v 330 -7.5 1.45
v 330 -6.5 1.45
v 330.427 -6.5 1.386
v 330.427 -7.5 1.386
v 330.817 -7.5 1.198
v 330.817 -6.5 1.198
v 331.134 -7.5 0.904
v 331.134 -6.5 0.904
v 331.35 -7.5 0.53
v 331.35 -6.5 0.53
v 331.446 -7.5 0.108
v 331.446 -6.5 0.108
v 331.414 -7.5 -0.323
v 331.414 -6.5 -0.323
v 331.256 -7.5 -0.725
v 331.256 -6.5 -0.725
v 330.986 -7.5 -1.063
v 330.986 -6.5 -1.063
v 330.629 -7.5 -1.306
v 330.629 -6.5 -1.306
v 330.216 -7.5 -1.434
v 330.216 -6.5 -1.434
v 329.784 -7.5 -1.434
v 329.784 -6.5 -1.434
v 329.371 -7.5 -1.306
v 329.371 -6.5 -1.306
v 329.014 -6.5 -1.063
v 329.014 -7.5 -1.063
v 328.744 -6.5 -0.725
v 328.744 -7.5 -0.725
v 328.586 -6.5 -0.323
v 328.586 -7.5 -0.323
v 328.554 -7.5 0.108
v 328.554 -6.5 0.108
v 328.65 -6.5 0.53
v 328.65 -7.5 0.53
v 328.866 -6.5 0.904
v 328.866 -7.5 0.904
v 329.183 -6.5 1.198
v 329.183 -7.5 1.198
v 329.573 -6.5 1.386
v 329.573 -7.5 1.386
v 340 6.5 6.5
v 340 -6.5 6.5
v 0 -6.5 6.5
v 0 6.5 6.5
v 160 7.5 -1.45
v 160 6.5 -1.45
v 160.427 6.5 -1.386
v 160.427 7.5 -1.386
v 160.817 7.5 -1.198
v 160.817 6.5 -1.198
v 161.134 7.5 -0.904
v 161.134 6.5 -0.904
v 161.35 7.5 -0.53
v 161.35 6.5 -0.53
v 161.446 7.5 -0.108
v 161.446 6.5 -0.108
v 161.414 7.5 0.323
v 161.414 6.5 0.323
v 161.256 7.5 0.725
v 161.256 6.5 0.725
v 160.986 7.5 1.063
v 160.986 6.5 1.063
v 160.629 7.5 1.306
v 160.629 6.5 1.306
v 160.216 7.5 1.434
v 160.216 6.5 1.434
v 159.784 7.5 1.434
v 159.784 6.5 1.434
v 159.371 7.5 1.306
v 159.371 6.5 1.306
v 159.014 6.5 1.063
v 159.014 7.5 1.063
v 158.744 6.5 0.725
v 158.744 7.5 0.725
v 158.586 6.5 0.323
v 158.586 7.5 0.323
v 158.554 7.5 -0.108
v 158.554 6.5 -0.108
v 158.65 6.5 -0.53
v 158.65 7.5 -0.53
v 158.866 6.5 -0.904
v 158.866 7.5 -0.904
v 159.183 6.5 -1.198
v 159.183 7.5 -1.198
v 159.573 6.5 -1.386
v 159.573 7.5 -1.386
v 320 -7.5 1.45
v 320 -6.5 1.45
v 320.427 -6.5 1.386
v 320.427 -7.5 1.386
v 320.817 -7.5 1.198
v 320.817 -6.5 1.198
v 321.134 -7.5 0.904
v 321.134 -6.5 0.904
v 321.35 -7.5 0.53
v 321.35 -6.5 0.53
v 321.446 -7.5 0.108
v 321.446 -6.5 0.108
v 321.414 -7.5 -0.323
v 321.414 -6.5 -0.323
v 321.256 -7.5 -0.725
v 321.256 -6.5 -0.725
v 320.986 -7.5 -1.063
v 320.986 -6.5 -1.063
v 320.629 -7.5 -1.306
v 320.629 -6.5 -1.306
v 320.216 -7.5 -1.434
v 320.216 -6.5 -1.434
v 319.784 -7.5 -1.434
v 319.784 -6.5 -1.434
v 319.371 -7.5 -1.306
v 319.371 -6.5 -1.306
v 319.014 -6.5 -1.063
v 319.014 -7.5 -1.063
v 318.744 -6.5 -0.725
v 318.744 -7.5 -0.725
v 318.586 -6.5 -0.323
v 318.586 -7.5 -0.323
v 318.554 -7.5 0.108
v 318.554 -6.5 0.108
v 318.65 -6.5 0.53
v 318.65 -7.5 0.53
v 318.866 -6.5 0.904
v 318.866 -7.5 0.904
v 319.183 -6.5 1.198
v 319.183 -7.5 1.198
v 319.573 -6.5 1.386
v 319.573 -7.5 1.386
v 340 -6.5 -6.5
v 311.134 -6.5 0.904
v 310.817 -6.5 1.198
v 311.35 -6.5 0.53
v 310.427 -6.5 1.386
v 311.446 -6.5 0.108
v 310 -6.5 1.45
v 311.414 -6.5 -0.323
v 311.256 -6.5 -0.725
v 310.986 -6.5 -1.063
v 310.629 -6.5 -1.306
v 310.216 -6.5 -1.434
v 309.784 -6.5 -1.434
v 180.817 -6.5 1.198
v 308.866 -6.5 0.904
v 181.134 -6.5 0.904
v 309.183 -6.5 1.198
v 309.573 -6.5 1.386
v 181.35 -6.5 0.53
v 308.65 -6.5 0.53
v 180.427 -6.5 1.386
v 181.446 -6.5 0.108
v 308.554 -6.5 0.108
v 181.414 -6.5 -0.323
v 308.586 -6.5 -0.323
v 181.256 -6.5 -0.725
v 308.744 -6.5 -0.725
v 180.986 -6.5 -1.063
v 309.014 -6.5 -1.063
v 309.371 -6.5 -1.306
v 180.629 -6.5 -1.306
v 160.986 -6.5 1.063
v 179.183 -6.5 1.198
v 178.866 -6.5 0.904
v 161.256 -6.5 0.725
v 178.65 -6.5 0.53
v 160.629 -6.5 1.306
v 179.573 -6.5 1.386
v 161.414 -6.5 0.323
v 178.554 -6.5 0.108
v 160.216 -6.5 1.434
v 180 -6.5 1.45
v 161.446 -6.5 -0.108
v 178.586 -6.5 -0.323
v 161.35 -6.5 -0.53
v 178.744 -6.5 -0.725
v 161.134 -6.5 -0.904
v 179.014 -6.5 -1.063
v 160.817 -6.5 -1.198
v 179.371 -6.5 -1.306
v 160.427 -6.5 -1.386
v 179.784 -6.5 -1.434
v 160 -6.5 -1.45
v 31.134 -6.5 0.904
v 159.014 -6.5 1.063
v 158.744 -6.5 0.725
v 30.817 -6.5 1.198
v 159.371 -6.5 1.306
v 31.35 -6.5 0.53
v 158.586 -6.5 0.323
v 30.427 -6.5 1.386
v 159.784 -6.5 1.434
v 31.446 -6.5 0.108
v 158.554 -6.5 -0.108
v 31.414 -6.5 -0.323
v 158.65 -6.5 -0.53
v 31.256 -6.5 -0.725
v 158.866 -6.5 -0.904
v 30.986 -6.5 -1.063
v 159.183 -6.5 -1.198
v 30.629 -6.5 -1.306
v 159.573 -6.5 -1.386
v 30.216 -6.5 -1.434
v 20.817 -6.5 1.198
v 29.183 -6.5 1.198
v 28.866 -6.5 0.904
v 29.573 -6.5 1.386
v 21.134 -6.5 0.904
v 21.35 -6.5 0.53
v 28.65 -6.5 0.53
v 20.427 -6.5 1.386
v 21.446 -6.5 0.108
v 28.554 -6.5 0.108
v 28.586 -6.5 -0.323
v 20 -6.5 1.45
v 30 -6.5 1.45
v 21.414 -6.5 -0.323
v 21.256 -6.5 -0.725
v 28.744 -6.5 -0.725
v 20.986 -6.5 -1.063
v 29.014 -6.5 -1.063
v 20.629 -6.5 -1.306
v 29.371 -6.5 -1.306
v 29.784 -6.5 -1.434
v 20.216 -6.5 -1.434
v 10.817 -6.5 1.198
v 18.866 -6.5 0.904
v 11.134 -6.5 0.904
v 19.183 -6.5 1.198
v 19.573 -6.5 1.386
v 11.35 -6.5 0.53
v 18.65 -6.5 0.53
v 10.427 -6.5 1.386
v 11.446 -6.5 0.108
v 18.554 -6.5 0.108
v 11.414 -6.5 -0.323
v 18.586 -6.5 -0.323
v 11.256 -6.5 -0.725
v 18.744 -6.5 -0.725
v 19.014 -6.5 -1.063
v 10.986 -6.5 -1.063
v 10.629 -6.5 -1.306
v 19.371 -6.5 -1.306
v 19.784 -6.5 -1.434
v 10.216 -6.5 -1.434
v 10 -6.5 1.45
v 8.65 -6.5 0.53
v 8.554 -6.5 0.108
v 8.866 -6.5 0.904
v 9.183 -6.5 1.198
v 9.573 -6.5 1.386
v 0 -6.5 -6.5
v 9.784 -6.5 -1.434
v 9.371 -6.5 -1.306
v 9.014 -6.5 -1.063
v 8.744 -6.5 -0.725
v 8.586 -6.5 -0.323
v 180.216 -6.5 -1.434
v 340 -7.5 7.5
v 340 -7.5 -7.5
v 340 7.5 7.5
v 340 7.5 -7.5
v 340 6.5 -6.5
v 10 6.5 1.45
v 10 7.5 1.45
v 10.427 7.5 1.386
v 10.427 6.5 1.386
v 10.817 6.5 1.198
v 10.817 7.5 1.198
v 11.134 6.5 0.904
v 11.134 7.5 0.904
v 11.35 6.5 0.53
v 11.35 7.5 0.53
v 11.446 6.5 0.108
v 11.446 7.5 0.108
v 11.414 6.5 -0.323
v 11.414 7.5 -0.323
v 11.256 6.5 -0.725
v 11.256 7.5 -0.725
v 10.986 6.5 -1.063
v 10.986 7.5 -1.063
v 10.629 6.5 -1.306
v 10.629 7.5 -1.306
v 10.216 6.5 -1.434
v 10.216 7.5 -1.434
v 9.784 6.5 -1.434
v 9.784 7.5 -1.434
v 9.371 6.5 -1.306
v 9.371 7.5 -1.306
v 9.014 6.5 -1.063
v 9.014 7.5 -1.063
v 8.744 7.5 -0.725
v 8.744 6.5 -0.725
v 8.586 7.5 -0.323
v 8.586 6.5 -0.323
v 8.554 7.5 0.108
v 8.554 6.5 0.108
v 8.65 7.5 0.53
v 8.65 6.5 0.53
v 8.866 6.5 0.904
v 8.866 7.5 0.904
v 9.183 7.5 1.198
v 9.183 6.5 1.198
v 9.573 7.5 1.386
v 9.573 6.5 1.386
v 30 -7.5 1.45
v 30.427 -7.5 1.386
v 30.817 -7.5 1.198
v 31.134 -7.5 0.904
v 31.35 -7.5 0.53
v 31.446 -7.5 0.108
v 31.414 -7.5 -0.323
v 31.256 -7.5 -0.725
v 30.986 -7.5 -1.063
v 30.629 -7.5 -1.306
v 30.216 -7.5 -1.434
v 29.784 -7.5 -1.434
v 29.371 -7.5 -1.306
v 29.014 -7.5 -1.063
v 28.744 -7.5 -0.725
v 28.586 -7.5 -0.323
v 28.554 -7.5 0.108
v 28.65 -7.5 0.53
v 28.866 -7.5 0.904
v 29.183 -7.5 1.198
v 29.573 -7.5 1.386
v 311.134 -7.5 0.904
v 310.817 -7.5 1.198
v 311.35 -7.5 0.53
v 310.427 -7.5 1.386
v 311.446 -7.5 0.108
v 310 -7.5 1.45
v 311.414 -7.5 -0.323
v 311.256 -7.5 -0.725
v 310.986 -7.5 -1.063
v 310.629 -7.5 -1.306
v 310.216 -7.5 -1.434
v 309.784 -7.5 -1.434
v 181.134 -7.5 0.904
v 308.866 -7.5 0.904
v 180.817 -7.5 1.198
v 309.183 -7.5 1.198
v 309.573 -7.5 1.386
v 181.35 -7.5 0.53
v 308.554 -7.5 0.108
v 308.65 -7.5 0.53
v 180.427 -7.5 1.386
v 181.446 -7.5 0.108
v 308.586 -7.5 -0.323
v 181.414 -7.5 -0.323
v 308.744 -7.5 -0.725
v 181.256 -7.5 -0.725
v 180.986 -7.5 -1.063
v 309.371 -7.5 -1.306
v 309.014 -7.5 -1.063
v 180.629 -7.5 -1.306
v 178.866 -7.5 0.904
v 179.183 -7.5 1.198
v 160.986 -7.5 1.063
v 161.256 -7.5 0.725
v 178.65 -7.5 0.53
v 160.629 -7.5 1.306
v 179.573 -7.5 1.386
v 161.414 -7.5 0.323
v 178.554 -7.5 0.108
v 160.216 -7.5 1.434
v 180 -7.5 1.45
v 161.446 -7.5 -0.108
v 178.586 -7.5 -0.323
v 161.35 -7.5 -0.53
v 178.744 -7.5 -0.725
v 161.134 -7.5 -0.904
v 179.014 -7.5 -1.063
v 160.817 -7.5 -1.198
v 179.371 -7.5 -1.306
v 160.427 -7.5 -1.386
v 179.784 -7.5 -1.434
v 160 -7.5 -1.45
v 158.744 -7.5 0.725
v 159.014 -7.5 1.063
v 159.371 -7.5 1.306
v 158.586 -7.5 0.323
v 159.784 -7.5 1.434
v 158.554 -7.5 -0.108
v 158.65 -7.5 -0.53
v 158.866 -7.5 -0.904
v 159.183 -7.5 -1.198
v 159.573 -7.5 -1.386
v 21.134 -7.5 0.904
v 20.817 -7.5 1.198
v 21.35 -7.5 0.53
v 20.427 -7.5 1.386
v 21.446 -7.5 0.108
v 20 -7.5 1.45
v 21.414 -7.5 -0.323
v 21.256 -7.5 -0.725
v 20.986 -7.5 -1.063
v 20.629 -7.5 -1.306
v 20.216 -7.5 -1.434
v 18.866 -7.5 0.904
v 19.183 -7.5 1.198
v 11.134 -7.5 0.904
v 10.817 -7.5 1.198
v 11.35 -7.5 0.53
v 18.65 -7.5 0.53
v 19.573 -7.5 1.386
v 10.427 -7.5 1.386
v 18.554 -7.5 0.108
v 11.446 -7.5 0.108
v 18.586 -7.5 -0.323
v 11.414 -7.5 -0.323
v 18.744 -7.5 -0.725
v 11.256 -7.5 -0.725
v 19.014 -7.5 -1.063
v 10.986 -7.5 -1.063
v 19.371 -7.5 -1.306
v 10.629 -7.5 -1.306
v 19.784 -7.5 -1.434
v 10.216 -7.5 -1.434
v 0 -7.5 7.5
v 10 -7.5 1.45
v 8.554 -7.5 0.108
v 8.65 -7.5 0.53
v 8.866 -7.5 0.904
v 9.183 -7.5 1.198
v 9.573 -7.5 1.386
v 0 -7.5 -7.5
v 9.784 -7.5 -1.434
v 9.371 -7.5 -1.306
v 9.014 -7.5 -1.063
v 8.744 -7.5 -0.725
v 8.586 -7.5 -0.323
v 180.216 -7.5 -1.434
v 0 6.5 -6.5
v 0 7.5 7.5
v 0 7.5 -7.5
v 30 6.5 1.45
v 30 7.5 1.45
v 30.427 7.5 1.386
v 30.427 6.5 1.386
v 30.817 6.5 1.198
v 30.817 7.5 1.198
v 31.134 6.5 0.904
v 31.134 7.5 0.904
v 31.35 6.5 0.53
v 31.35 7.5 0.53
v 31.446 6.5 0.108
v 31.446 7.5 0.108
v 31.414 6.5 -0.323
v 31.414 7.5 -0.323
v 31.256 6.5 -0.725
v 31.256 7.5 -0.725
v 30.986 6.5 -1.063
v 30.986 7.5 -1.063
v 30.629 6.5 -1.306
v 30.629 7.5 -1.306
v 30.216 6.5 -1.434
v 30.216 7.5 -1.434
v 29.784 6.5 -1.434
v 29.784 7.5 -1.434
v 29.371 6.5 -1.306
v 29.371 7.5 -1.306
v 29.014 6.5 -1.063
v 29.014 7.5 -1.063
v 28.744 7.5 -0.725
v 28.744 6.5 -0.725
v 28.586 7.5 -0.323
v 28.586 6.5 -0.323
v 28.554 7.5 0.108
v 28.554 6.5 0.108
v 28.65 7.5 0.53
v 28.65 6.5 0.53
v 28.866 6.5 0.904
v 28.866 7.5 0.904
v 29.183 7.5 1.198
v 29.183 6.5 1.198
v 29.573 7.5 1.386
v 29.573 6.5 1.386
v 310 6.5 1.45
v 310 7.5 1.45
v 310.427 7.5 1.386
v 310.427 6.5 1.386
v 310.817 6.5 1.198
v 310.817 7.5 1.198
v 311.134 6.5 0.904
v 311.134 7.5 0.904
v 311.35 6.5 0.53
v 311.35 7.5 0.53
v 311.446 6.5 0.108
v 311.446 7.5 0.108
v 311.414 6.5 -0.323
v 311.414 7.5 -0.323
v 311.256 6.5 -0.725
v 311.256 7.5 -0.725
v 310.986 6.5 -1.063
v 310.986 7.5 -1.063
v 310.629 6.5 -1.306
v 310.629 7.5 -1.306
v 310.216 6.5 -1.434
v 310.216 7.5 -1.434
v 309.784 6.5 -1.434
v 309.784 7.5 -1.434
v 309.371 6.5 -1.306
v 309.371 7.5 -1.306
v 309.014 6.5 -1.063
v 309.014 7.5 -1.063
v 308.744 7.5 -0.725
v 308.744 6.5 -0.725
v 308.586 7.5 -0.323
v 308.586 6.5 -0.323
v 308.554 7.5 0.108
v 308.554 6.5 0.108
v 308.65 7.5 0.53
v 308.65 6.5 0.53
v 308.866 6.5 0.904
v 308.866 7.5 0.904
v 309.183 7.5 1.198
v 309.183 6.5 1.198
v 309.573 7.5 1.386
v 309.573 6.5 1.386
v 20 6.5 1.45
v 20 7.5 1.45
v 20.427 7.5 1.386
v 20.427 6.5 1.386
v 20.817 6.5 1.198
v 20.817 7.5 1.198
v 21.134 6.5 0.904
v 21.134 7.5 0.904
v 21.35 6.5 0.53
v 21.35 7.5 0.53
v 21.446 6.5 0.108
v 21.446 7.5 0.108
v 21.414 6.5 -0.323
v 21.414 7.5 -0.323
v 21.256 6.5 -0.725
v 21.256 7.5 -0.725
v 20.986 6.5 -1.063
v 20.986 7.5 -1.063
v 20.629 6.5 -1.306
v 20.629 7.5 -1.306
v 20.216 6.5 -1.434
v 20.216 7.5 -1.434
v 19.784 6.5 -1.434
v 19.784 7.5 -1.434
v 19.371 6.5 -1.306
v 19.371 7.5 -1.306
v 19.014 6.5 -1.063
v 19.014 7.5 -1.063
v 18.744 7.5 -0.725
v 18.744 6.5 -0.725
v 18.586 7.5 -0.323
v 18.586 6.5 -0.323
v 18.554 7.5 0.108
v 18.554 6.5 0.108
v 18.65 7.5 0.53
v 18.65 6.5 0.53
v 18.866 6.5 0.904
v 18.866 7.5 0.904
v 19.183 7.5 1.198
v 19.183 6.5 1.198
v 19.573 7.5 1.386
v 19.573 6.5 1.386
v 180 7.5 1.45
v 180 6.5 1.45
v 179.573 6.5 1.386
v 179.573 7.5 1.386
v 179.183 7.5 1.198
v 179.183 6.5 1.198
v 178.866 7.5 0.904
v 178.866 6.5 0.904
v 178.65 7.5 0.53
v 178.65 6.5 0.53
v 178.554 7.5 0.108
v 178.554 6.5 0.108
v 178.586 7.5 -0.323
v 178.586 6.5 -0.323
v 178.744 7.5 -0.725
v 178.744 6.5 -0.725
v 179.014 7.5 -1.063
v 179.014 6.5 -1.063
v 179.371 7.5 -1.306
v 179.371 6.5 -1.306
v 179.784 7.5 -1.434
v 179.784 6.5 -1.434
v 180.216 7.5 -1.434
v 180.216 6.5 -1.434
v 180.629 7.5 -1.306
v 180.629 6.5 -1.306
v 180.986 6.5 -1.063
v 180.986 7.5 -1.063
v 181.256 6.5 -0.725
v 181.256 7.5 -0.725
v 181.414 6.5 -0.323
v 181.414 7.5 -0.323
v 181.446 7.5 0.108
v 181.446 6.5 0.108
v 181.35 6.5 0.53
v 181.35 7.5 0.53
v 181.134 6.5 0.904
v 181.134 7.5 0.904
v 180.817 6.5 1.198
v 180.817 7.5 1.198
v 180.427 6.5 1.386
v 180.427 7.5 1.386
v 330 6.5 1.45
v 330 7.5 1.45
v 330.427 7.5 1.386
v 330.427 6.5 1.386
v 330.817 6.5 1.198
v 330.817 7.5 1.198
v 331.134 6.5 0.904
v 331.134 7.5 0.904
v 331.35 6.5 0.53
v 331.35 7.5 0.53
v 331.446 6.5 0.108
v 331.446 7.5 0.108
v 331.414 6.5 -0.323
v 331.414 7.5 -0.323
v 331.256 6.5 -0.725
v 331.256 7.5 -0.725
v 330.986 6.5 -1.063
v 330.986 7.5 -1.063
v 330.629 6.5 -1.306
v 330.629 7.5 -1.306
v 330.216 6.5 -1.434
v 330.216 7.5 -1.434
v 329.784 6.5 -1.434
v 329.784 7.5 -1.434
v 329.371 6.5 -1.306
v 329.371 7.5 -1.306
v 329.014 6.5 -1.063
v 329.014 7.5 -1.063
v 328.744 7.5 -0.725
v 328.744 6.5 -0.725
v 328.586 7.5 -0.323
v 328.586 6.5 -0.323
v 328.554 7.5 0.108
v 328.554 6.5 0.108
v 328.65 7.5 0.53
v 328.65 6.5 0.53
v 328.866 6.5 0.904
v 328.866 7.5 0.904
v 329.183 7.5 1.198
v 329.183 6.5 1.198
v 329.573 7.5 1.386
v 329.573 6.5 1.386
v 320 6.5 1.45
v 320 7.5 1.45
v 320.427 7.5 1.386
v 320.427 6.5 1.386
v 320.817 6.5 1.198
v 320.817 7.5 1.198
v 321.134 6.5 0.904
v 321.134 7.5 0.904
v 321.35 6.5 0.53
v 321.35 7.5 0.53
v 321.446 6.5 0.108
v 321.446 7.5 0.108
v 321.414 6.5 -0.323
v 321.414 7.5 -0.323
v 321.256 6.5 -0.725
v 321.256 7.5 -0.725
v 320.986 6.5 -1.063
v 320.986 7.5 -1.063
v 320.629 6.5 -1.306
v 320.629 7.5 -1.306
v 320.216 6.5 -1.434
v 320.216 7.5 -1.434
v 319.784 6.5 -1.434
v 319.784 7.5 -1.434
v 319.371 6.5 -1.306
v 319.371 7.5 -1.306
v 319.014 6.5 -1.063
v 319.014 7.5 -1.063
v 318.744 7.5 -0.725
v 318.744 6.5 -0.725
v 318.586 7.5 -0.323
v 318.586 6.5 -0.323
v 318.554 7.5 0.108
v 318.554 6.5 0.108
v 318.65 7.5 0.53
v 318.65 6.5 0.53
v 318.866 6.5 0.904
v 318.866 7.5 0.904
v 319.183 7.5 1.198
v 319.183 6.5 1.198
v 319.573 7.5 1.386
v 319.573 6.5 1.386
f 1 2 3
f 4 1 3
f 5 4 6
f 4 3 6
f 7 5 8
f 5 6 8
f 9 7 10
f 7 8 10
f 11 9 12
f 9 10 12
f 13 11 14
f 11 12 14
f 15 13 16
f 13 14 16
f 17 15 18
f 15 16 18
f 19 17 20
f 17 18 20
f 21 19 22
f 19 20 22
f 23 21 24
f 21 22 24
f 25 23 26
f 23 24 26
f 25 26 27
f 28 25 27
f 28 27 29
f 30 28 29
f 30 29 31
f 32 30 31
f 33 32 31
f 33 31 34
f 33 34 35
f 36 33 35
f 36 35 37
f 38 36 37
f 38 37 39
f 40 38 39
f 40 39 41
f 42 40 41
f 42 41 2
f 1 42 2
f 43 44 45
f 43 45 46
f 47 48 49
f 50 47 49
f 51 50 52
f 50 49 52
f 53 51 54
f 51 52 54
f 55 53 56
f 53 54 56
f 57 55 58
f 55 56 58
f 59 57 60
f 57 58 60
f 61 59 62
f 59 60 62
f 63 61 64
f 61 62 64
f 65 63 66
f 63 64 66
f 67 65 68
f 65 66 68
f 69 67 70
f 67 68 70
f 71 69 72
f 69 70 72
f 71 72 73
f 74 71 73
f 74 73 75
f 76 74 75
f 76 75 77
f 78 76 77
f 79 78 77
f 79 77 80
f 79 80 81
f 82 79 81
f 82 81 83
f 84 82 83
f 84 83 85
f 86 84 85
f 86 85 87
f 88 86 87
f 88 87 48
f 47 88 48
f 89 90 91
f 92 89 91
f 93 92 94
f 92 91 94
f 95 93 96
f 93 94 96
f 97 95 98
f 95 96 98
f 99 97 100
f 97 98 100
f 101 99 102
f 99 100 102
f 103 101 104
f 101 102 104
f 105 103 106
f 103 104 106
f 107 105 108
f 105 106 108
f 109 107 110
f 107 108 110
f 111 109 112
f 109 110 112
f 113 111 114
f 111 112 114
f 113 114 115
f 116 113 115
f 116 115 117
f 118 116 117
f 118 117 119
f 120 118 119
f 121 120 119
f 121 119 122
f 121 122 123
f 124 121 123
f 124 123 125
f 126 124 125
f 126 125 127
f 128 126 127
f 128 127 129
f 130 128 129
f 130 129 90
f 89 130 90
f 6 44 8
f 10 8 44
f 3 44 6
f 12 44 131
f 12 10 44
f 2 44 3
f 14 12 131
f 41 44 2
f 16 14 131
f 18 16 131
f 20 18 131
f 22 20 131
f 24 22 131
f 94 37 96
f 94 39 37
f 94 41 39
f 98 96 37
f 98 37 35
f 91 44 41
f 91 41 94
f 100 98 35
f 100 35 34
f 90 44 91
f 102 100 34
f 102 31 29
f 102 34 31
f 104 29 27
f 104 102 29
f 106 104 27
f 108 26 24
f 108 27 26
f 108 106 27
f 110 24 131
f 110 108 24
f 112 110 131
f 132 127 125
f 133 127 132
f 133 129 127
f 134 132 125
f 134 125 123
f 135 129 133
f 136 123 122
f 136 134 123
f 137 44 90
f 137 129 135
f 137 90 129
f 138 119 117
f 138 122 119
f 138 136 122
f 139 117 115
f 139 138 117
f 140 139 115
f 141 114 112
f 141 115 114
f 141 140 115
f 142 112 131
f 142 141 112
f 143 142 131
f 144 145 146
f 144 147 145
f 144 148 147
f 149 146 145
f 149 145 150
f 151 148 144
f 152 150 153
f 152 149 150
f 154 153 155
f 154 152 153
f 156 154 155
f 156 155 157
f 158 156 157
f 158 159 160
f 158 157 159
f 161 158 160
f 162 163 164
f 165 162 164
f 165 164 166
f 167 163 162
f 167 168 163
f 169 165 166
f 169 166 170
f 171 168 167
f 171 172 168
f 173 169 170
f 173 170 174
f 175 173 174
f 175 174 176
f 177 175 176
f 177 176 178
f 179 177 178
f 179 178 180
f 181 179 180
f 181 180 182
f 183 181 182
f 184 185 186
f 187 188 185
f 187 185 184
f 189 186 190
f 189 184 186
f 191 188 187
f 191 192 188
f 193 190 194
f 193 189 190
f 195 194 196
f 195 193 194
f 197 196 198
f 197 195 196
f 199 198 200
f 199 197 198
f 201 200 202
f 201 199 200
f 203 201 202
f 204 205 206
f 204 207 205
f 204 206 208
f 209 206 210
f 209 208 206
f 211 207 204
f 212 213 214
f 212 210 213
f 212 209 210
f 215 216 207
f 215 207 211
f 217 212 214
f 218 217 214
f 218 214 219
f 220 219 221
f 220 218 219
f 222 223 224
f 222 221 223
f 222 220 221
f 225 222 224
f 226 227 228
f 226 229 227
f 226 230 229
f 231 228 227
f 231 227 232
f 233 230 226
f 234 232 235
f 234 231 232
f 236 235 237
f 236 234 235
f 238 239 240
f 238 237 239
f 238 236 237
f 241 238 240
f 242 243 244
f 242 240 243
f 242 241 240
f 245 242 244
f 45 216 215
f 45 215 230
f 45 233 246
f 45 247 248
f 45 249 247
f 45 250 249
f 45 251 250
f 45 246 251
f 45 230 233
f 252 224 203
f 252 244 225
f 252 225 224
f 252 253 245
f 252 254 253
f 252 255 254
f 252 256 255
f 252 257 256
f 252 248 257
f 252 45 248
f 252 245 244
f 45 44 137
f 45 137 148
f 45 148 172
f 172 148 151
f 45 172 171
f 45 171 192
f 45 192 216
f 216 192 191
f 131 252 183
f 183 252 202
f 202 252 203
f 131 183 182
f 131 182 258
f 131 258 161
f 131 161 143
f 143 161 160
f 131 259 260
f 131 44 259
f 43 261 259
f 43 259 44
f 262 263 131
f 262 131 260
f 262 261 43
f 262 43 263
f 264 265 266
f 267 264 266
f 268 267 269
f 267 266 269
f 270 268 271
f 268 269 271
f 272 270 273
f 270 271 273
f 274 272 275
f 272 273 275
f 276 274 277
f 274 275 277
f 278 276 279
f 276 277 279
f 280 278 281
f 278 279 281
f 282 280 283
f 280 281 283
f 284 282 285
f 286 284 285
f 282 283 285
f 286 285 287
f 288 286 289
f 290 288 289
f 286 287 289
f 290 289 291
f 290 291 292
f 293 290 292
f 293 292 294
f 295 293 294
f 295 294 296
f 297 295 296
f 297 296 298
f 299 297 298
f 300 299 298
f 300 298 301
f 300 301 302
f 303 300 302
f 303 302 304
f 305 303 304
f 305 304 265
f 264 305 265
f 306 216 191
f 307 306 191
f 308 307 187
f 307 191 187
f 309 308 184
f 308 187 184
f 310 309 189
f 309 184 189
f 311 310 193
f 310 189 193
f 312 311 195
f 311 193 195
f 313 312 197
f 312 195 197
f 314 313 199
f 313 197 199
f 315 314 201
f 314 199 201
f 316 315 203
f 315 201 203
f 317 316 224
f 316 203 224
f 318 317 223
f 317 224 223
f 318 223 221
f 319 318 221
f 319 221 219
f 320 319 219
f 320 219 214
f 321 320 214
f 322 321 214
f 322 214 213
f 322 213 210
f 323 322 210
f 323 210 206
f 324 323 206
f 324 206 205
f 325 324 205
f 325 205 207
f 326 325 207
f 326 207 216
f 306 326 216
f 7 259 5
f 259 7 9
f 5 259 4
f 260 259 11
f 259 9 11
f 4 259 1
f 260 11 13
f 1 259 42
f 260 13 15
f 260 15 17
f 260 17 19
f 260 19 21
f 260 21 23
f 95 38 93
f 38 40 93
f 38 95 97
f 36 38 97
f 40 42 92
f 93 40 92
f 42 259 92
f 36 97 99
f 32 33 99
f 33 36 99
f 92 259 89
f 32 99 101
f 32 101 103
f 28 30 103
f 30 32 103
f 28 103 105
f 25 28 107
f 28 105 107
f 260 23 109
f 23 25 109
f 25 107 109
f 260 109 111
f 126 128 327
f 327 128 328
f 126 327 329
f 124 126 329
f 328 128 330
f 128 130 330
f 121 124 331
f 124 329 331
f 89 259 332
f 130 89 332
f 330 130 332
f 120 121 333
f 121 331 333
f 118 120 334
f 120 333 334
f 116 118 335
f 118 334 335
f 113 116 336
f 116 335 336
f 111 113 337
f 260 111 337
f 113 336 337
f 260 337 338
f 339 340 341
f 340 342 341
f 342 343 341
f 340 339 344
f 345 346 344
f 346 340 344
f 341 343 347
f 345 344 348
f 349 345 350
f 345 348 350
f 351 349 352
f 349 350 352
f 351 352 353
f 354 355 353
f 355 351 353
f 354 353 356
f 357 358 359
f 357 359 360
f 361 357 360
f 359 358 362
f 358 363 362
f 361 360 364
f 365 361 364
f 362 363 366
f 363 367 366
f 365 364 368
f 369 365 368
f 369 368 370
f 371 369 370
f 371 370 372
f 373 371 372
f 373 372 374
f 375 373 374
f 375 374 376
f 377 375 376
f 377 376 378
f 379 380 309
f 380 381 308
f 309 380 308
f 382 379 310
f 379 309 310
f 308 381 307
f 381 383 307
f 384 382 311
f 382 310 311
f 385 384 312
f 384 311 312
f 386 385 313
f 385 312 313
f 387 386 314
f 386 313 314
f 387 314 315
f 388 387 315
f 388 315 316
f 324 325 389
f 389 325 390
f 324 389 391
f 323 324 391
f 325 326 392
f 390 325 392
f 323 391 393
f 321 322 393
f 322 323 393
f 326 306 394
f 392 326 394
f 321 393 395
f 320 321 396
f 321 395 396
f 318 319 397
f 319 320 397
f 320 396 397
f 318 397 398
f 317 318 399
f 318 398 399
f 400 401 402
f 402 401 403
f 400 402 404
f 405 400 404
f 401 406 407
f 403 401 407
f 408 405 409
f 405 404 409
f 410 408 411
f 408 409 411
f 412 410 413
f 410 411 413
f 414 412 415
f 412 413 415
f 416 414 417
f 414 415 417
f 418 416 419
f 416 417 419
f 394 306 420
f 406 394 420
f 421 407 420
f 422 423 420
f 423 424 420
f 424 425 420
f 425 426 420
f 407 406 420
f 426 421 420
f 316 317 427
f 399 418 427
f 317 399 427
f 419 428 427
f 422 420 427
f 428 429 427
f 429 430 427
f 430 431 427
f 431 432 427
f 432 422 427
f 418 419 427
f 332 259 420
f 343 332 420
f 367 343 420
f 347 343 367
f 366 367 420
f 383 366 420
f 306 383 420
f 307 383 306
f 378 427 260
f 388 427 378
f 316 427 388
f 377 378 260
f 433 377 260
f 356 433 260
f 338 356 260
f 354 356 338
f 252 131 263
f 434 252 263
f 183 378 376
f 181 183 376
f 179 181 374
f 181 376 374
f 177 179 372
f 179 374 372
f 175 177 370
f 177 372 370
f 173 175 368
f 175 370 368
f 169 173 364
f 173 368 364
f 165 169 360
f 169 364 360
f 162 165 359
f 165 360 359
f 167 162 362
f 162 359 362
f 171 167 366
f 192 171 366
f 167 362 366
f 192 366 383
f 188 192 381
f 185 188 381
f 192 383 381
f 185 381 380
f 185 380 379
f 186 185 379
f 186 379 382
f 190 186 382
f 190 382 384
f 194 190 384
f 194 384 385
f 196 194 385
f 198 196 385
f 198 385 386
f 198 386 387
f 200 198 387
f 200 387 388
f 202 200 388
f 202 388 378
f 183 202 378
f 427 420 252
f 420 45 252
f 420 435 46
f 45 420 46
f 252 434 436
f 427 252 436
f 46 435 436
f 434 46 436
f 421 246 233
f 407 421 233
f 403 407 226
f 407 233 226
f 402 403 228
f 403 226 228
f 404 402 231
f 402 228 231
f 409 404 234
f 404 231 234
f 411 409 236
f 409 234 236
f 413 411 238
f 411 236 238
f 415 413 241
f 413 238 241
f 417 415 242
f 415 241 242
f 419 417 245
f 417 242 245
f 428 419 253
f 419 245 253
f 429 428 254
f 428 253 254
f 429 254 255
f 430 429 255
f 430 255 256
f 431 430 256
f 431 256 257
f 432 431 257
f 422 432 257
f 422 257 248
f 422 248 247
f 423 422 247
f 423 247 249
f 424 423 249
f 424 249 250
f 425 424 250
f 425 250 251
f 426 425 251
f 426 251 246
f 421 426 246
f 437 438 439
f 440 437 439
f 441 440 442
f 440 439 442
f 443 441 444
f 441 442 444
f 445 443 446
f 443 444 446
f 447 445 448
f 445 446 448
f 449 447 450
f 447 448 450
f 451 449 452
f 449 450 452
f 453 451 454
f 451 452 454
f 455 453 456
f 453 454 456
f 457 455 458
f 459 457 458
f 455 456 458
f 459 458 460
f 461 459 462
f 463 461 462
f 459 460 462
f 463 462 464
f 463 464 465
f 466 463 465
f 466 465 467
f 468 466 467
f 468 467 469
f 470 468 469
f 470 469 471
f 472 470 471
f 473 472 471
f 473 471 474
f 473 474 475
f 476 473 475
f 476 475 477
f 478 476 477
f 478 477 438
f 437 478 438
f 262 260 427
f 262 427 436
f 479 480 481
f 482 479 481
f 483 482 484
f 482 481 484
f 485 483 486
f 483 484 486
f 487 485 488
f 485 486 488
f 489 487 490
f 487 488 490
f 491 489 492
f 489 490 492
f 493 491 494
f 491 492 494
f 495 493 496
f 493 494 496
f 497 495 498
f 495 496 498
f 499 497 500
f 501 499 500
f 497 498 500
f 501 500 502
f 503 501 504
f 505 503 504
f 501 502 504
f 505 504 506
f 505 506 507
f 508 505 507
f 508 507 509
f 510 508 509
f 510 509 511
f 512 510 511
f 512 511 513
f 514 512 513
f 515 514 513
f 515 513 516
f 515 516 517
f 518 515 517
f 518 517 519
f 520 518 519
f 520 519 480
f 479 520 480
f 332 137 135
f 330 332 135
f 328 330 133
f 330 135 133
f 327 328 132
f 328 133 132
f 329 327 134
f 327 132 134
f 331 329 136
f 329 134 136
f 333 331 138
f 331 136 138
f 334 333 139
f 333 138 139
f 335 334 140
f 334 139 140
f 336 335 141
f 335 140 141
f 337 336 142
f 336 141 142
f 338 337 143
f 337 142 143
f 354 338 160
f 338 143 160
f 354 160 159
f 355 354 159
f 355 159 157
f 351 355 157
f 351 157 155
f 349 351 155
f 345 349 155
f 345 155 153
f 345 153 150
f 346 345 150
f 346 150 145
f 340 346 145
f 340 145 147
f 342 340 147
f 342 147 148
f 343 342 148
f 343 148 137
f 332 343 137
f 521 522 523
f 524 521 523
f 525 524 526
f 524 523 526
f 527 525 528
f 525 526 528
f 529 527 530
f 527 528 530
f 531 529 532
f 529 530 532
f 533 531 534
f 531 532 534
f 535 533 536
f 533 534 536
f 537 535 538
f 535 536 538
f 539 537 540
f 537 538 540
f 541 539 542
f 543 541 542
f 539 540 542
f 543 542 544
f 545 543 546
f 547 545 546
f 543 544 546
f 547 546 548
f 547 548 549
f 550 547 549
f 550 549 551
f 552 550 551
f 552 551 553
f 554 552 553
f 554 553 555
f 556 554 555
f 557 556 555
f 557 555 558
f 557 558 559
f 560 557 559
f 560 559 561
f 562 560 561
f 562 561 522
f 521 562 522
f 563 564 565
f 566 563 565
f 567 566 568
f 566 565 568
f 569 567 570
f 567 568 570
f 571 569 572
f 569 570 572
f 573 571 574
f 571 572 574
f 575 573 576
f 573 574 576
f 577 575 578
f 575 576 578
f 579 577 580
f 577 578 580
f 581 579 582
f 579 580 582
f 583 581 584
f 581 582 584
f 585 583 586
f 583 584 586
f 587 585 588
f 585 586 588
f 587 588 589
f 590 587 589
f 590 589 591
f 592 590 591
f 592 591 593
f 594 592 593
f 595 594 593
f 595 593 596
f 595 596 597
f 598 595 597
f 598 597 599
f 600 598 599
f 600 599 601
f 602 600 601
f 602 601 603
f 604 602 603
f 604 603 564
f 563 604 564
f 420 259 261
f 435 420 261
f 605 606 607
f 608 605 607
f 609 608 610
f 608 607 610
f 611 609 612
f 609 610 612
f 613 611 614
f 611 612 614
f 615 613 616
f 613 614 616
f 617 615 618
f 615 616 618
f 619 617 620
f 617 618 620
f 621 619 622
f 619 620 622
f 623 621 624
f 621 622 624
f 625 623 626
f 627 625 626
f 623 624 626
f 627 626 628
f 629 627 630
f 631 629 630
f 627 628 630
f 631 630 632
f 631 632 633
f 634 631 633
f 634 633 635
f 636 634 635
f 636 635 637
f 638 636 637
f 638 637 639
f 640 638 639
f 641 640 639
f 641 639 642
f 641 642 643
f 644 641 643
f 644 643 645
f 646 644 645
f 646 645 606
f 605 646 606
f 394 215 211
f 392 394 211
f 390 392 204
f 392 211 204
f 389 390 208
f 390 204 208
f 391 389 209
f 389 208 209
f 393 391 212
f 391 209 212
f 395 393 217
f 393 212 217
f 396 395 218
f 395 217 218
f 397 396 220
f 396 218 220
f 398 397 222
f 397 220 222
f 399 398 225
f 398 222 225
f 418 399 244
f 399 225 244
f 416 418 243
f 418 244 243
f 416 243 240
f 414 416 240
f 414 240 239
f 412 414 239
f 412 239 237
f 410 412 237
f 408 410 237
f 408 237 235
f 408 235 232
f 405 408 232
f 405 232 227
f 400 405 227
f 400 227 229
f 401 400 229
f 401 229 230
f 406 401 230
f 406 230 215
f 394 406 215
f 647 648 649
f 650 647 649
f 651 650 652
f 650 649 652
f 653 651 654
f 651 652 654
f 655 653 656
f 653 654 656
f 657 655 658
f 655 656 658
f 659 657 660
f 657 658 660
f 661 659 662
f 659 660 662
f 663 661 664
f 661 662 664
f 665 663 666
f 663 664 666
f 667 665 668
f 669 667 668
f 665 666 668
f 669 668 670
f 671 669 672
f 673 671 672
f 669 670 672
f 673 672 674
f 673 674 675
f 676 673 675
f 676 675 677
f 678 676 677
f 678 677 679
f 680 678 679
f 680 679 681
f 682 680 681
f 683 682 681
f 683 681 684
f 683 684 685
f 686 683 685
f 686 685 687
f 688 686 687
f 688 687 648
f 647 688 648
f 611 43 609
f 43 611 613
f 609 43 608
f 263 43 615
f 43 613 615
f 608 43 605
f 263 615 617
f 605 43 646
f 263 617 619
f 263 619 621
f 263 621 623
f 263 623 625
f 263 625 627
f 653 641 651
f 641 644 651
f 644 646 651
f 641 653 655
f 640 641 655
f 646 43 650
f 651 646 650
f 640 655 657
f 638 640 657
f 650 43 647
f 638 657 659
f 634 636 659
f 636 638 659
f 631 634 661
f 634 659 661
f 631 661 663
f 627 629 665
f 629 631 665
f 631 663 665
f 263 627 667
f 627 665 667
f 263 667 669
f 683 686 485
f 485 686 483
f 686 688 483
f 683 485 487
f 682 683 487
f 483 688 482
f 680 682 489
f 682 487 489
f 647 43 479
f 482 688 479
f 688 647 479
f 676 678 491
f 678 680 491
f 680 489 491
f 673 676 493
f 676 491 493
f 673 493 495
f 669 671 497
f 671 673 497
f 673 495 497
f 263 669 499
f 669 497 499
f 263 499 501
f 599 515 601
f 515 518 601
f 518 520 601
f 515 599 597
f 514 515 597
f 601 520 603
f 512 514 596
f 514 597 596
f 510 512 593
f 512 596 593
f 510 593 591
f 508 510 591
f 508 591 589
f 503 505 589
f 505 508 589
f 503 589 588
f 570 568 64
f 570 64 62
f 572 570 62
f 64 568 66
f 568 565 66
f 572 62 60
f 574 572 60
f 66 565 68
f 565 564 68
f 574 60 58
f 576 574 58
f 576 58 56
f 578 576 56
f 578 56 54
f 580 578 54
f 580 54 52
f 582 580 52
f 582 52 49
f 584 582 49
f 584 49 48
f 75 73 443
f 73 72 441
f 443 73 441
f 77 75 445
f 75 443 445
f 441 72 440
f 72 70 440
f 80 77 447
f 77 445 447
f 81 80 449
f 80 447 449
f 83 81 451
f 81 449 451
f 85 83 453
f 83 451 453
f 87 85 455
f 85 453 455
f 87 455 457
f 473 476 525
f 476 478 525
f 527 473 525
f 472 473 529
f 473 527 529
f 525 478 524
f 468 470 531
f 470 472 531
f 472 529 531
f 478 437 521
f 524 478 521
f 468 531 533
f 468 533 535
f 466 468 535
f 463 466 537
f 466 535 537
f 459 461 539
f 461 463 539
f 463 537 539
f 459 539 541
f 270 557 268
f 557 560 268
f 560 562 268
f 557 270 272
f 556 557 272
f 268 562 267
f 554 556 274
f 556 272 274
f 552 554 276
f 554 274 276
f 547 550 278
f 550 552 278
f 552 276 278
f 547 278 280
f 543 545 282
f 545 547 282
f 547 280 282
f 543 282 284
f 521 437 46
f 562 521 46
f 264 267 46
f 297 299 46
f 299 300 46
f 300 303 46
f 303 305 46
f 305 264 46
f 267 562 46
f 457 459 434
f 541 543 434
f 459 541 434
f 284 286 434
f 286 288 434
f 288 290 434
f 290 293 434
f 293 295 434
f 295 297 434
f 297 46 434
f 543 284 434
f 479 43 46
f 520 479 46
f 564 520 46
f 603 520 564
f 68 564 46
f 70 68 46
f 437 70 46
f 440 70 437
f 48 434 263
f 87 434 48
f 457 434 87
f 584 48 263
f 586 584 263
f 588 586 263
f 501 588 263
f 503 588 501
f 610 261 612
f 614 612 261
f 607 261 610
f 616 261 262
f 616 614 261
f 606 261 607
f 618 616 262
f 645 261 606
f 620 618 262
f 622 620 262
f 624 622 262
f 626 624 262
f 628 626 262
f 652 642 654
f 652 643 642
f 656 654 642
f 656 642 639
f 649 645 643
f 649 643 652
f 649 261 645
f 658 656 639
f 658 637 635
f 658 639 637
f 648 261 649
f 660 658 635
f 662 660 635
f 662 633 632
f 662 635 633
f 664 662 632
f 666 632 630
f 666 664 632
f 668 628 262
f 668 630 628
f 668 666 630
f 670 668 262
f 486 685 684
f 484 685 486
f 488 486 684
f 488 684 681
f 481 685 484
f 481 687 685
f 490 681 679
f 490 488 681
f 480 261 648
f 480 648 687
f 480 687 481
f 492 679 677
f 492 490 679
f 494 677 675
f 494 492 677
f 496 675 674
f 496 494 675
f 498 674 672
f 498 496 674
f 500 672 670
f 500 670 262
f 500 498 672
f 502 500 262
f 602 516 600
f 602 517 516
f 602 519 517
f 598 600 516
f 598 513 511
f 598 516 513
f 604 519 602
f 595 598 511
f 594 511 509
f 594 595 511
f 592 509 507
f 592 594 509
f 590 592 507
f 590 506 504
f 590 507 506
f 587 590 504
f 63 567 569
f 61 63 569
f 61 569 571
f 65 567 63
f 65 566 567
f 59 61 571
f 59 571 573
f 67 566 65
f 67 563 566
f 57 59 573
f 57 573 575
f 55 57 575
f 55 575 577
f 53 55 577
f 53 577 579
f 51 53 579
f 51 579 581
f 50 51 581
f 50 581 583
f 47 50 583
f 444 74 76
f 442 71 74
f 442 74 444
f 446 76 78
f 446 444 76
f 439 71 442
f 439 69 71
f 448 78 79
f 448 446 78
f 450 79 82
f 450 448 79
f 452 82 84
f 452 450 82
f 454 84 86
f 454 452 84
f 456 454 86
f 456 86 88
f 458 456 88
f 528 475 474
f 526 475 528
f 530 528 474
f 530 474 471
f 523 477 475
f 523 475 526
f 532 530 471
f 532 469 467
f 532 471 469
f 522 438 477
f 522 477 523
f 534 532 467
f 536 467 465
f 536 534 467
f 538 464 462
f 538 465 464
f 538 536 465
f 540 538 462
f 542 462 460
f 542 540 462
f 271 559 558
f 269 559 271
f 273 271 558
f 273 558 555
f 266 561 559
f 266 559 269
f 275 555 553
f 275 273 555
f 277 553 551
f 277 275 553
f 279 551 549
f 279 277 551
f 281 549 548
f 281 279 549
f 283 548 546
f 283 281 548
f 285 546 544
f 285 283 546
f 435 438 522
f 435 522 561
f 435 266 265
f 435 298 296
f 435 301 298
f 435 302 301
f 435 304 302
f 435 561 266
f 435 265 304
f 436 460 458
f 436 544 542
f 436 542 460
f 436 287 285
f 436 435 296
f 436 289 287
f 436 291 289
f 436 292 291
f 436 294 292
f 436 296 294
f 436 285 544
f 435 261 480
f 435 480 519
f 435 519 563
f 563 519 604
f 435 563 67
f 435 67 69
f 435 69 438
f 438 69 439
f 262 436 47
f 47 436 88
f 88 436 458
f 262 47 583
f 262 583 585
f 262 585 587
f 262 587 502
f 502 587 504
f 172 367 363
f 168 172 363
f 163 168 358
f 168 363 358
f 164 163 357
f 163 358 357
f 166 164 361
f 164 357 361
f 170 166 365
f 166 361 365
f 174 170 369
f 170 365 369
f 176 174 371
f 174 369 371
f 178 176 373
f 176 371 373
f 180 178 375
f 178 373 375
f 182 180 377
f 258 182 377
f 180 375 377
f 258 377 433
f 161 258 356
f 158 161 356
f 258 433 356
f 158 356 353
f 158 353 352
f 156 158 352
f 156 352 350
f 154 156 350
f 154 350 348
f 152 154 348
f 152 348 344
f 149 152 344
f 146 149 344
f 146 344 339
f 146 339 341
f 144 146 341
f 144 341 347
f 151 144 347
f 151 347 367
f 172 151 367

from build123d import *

# Parameters (mm, degrees)
SKETCH_1_W          = 15
SKETCH_1_H          = 15
SKETCH_1_W_2        = 13
SKETCH_1_H_2        = 13
EXTRUDE_1_DEPTH     = 340
SKETCH_2_R          = 1.45
CUT_EXTRUDE_1_DEPTH = 341.413351677
SKETCH_3_R          = 1.45
CUT_EXTRUDE_2_DEPTH = 341.413351677


with BuildPart() as part:
    # 草图1 → 凸台-拉伸1 (new body)
    with BuildSketch(Plane(origin=(0, 0, 0), x_dir=(0, 0, -1), z_dir=(1, 0, 0))):
        Rectangle(SKETCH_1_W, SKETCH_1_H)
        Rectangle(SKETCH_1_W_2, SKETCH_1_H_2, mode=Mode.SUBTRACT)
    extrude(amount=EXTRUDE_1_DEPTH)

    # 草图2 → 切除-拉伸1 (cut, through all)
    with BuildSketch(Plane.XZ.offset(7.5)):
        with Locations(Location((160, 0, 0), (0, 0, 270))):
            Circle(SKETCH_2_R)
        with Locations(Location((180, 0, 0), (0, 0, 90))):
            Circle(SKETCH_2_R)
    extrude(amount=-CUT_EXTRUDE_1_DEPTH, mode=Mode.SUBTRACT)

    # 草图3 → 切除-拉伸2 (cut, through all)
    with BuildSketch(Plane(origin=(0, 7.5, 0), x_dir=(1, 0, 0), z_dir=(0, 1, 0))):
        with Locations(Location((180, 0, 0), (0, 0, 270))):
            Circle(SKETCH_3_R)
        with Locations(Location((160, 0, 0), (0, 0, 90))):
            Circle(SKETCH_3_R)
        with Locations(Location((20, 0, 0), (0, 0, 270))):
            Circle(SKETCH_3_R)
        with Locations(Location((30, 0, 0), (0, 0, 270))):
            Circle(SKETCH_3_R)
        with Locations(Location((10, 0, 0), (0, 0, 270))):
            Circle(SKETCH_3_R)
        with Locations(Location((330, 0, 0), (0, 0, 270))):
            Circle(SKETCH_3_R)
        with Locations(Location((310, 0, 0), (0, 0, 270))):
            Circle(SKETCH_3_R)
        with Locations(Location((320, 0, 0), (0, 0, 270))):
            Circle(SKETCH_3_R)
    extrude(amount=-CUT_EXTRUDE_2_DEPTH, mode=Mode.SUBTRACT)


solid = part.part
